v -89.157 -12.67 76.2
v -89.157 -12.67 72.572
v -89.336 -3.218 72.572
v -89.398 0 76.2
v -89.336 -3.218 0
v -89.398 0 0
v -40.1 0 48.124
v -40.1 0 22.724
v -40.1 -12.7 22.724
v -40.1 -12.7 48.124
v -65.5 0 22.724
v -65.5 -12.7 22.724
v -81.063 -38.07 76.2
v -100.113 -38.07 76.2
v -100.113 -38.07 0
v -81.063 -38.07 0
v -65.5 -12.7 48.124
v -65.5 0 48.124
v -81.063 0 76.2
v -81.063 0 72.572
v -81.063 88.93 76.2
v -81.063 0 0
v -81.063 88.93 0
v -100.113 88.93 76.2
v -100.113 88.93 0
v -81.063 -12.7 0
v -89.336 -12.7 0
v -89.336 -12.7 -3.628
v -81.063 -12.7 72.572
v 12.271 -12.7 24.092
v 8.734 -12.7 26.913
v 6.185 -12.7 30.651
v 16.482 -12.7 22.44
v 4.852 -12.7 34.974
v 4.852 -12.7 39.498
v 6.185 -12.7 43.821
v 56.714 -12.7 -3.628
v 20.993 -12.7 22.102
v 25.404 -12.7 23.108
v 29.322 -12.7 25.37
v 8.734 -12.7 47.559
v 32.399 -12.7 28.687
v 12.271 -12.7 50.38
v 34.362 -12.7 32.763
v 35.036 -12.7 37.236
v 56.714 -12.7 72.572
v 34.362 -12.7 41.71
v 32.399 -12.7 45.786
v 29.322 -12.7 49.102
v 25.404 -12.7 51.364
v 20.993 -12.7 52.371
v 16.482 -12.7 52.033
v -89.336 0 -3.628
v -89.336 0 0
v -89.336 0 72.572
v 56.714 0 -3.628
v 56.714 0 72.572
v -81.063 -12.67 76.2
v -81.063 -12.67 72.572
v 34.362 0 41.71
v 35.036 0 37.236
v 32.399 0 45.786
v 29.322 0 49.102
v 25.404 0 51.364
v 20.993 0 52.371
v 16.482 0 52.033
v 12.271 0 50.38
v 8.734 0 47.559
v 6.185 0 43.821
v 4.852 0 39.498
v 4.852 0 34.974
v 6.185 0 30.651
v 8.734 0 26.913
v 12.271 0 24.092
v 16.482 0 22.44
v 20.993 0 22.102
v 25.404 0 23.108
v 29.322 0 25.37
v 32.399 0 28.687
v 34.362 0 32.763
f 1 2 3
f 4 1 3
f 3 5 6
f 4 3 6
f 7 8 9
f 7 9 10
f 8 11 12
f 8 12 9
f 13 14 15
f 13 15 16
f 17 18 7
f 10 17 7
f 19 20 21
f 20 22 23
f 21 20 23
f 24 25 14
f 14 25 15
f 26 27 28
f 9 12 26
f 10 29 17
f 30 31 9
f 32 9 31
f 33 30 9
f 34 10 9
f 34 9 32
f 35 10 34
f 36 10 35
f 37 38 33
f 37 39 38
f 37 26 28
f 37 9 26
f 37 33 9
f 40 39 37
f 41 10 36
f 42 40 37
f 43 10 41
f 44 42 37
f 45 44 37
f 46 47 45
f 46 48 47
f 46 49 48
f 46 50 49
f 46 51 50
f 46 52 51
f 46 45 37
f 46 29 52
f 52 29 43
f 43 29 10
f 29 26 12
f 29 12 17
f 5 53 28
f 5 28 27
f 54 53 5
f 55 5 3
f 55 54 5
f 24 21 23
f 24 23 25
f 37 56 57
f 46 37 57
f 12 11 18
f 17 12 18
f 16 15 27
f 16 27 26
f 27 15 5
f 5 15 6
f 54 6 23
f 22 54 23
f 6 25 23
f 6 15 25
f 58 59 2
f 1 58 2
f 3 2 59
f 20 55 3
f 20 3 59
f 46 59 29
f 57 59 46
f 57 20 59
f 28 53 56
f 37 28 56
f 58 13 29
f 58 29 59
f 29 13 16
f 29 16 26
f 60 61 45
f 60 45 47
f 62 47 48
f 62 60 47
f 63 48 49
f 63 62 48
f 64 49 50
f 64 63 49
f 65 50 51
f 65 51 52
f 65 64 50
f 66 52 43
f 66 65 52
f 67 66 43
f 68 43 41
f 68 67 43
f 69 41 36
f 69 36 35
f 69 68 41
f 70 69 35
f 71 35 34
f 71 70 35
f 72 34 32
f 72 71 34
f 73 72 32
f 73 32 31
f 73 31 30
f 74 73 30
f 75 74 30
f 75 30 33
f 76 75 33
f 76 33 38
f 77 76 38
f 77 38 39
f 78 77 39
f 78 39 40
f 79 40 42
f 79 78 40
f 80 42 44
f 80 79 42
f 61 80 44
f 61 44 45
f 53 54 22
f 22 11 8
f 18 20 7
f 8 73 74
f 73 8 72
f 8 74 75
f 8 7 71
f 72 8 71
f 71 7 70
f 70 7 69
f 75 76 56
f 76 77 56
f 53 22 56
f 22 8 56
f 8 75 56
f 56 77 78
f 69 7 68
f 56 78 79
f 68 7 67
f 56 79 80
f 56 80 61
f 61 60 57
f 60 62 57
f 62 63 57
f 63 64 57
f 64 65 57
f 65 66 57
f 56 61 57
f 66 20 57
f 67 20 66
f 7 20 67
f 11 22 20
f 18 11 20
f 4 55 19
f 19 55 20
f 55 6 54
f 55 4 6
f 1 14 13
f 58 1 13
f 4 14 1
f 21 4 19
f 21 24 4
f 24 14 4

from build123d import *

# Parameters (mm, degrees)
F0_W     = 146.05
F0_H     = 76.2
F0_W_2   = 25.4
F0_H_2   = 25.4
F0_R     = 15.176992
F1_DEPTH = 12.7
F3_DEPTH = 76.2


with BuildPart() as f1:
    # F0 (on Front) → F1 (new body)
    with BuildSketch(Plane.XZ):
        with Locations((-16.311467, 34.471862)):
            Rectangle(F0_W, F0_H)
        with Locations((-52.800478, 35.423604)):
            Rectangle(F0_W_2, F0_H_2, mode=Mode.SUBTRACT)
        with Locations((19.859284, 37.236158)):
            Circle(F0_R, mode=Mode.SUBTRACT)
    extrude(amount=F1_DEPTH)

    # F2 (on Top) → F3 (join)
    with BuildSketch(Plane.XY):
        Polygon((-100.113213, -38.069502), (-81.063213, -38.069502), (-81.063213, -12.669502), (-89.156985, -12.669502), (-89.397579, 0), (-81.063213, 0), (-81.063213, 88.930498), (-100.113213, 88.930498), align=None)
    extrude(amount=F3_DEPTH)


solid = f1.part
